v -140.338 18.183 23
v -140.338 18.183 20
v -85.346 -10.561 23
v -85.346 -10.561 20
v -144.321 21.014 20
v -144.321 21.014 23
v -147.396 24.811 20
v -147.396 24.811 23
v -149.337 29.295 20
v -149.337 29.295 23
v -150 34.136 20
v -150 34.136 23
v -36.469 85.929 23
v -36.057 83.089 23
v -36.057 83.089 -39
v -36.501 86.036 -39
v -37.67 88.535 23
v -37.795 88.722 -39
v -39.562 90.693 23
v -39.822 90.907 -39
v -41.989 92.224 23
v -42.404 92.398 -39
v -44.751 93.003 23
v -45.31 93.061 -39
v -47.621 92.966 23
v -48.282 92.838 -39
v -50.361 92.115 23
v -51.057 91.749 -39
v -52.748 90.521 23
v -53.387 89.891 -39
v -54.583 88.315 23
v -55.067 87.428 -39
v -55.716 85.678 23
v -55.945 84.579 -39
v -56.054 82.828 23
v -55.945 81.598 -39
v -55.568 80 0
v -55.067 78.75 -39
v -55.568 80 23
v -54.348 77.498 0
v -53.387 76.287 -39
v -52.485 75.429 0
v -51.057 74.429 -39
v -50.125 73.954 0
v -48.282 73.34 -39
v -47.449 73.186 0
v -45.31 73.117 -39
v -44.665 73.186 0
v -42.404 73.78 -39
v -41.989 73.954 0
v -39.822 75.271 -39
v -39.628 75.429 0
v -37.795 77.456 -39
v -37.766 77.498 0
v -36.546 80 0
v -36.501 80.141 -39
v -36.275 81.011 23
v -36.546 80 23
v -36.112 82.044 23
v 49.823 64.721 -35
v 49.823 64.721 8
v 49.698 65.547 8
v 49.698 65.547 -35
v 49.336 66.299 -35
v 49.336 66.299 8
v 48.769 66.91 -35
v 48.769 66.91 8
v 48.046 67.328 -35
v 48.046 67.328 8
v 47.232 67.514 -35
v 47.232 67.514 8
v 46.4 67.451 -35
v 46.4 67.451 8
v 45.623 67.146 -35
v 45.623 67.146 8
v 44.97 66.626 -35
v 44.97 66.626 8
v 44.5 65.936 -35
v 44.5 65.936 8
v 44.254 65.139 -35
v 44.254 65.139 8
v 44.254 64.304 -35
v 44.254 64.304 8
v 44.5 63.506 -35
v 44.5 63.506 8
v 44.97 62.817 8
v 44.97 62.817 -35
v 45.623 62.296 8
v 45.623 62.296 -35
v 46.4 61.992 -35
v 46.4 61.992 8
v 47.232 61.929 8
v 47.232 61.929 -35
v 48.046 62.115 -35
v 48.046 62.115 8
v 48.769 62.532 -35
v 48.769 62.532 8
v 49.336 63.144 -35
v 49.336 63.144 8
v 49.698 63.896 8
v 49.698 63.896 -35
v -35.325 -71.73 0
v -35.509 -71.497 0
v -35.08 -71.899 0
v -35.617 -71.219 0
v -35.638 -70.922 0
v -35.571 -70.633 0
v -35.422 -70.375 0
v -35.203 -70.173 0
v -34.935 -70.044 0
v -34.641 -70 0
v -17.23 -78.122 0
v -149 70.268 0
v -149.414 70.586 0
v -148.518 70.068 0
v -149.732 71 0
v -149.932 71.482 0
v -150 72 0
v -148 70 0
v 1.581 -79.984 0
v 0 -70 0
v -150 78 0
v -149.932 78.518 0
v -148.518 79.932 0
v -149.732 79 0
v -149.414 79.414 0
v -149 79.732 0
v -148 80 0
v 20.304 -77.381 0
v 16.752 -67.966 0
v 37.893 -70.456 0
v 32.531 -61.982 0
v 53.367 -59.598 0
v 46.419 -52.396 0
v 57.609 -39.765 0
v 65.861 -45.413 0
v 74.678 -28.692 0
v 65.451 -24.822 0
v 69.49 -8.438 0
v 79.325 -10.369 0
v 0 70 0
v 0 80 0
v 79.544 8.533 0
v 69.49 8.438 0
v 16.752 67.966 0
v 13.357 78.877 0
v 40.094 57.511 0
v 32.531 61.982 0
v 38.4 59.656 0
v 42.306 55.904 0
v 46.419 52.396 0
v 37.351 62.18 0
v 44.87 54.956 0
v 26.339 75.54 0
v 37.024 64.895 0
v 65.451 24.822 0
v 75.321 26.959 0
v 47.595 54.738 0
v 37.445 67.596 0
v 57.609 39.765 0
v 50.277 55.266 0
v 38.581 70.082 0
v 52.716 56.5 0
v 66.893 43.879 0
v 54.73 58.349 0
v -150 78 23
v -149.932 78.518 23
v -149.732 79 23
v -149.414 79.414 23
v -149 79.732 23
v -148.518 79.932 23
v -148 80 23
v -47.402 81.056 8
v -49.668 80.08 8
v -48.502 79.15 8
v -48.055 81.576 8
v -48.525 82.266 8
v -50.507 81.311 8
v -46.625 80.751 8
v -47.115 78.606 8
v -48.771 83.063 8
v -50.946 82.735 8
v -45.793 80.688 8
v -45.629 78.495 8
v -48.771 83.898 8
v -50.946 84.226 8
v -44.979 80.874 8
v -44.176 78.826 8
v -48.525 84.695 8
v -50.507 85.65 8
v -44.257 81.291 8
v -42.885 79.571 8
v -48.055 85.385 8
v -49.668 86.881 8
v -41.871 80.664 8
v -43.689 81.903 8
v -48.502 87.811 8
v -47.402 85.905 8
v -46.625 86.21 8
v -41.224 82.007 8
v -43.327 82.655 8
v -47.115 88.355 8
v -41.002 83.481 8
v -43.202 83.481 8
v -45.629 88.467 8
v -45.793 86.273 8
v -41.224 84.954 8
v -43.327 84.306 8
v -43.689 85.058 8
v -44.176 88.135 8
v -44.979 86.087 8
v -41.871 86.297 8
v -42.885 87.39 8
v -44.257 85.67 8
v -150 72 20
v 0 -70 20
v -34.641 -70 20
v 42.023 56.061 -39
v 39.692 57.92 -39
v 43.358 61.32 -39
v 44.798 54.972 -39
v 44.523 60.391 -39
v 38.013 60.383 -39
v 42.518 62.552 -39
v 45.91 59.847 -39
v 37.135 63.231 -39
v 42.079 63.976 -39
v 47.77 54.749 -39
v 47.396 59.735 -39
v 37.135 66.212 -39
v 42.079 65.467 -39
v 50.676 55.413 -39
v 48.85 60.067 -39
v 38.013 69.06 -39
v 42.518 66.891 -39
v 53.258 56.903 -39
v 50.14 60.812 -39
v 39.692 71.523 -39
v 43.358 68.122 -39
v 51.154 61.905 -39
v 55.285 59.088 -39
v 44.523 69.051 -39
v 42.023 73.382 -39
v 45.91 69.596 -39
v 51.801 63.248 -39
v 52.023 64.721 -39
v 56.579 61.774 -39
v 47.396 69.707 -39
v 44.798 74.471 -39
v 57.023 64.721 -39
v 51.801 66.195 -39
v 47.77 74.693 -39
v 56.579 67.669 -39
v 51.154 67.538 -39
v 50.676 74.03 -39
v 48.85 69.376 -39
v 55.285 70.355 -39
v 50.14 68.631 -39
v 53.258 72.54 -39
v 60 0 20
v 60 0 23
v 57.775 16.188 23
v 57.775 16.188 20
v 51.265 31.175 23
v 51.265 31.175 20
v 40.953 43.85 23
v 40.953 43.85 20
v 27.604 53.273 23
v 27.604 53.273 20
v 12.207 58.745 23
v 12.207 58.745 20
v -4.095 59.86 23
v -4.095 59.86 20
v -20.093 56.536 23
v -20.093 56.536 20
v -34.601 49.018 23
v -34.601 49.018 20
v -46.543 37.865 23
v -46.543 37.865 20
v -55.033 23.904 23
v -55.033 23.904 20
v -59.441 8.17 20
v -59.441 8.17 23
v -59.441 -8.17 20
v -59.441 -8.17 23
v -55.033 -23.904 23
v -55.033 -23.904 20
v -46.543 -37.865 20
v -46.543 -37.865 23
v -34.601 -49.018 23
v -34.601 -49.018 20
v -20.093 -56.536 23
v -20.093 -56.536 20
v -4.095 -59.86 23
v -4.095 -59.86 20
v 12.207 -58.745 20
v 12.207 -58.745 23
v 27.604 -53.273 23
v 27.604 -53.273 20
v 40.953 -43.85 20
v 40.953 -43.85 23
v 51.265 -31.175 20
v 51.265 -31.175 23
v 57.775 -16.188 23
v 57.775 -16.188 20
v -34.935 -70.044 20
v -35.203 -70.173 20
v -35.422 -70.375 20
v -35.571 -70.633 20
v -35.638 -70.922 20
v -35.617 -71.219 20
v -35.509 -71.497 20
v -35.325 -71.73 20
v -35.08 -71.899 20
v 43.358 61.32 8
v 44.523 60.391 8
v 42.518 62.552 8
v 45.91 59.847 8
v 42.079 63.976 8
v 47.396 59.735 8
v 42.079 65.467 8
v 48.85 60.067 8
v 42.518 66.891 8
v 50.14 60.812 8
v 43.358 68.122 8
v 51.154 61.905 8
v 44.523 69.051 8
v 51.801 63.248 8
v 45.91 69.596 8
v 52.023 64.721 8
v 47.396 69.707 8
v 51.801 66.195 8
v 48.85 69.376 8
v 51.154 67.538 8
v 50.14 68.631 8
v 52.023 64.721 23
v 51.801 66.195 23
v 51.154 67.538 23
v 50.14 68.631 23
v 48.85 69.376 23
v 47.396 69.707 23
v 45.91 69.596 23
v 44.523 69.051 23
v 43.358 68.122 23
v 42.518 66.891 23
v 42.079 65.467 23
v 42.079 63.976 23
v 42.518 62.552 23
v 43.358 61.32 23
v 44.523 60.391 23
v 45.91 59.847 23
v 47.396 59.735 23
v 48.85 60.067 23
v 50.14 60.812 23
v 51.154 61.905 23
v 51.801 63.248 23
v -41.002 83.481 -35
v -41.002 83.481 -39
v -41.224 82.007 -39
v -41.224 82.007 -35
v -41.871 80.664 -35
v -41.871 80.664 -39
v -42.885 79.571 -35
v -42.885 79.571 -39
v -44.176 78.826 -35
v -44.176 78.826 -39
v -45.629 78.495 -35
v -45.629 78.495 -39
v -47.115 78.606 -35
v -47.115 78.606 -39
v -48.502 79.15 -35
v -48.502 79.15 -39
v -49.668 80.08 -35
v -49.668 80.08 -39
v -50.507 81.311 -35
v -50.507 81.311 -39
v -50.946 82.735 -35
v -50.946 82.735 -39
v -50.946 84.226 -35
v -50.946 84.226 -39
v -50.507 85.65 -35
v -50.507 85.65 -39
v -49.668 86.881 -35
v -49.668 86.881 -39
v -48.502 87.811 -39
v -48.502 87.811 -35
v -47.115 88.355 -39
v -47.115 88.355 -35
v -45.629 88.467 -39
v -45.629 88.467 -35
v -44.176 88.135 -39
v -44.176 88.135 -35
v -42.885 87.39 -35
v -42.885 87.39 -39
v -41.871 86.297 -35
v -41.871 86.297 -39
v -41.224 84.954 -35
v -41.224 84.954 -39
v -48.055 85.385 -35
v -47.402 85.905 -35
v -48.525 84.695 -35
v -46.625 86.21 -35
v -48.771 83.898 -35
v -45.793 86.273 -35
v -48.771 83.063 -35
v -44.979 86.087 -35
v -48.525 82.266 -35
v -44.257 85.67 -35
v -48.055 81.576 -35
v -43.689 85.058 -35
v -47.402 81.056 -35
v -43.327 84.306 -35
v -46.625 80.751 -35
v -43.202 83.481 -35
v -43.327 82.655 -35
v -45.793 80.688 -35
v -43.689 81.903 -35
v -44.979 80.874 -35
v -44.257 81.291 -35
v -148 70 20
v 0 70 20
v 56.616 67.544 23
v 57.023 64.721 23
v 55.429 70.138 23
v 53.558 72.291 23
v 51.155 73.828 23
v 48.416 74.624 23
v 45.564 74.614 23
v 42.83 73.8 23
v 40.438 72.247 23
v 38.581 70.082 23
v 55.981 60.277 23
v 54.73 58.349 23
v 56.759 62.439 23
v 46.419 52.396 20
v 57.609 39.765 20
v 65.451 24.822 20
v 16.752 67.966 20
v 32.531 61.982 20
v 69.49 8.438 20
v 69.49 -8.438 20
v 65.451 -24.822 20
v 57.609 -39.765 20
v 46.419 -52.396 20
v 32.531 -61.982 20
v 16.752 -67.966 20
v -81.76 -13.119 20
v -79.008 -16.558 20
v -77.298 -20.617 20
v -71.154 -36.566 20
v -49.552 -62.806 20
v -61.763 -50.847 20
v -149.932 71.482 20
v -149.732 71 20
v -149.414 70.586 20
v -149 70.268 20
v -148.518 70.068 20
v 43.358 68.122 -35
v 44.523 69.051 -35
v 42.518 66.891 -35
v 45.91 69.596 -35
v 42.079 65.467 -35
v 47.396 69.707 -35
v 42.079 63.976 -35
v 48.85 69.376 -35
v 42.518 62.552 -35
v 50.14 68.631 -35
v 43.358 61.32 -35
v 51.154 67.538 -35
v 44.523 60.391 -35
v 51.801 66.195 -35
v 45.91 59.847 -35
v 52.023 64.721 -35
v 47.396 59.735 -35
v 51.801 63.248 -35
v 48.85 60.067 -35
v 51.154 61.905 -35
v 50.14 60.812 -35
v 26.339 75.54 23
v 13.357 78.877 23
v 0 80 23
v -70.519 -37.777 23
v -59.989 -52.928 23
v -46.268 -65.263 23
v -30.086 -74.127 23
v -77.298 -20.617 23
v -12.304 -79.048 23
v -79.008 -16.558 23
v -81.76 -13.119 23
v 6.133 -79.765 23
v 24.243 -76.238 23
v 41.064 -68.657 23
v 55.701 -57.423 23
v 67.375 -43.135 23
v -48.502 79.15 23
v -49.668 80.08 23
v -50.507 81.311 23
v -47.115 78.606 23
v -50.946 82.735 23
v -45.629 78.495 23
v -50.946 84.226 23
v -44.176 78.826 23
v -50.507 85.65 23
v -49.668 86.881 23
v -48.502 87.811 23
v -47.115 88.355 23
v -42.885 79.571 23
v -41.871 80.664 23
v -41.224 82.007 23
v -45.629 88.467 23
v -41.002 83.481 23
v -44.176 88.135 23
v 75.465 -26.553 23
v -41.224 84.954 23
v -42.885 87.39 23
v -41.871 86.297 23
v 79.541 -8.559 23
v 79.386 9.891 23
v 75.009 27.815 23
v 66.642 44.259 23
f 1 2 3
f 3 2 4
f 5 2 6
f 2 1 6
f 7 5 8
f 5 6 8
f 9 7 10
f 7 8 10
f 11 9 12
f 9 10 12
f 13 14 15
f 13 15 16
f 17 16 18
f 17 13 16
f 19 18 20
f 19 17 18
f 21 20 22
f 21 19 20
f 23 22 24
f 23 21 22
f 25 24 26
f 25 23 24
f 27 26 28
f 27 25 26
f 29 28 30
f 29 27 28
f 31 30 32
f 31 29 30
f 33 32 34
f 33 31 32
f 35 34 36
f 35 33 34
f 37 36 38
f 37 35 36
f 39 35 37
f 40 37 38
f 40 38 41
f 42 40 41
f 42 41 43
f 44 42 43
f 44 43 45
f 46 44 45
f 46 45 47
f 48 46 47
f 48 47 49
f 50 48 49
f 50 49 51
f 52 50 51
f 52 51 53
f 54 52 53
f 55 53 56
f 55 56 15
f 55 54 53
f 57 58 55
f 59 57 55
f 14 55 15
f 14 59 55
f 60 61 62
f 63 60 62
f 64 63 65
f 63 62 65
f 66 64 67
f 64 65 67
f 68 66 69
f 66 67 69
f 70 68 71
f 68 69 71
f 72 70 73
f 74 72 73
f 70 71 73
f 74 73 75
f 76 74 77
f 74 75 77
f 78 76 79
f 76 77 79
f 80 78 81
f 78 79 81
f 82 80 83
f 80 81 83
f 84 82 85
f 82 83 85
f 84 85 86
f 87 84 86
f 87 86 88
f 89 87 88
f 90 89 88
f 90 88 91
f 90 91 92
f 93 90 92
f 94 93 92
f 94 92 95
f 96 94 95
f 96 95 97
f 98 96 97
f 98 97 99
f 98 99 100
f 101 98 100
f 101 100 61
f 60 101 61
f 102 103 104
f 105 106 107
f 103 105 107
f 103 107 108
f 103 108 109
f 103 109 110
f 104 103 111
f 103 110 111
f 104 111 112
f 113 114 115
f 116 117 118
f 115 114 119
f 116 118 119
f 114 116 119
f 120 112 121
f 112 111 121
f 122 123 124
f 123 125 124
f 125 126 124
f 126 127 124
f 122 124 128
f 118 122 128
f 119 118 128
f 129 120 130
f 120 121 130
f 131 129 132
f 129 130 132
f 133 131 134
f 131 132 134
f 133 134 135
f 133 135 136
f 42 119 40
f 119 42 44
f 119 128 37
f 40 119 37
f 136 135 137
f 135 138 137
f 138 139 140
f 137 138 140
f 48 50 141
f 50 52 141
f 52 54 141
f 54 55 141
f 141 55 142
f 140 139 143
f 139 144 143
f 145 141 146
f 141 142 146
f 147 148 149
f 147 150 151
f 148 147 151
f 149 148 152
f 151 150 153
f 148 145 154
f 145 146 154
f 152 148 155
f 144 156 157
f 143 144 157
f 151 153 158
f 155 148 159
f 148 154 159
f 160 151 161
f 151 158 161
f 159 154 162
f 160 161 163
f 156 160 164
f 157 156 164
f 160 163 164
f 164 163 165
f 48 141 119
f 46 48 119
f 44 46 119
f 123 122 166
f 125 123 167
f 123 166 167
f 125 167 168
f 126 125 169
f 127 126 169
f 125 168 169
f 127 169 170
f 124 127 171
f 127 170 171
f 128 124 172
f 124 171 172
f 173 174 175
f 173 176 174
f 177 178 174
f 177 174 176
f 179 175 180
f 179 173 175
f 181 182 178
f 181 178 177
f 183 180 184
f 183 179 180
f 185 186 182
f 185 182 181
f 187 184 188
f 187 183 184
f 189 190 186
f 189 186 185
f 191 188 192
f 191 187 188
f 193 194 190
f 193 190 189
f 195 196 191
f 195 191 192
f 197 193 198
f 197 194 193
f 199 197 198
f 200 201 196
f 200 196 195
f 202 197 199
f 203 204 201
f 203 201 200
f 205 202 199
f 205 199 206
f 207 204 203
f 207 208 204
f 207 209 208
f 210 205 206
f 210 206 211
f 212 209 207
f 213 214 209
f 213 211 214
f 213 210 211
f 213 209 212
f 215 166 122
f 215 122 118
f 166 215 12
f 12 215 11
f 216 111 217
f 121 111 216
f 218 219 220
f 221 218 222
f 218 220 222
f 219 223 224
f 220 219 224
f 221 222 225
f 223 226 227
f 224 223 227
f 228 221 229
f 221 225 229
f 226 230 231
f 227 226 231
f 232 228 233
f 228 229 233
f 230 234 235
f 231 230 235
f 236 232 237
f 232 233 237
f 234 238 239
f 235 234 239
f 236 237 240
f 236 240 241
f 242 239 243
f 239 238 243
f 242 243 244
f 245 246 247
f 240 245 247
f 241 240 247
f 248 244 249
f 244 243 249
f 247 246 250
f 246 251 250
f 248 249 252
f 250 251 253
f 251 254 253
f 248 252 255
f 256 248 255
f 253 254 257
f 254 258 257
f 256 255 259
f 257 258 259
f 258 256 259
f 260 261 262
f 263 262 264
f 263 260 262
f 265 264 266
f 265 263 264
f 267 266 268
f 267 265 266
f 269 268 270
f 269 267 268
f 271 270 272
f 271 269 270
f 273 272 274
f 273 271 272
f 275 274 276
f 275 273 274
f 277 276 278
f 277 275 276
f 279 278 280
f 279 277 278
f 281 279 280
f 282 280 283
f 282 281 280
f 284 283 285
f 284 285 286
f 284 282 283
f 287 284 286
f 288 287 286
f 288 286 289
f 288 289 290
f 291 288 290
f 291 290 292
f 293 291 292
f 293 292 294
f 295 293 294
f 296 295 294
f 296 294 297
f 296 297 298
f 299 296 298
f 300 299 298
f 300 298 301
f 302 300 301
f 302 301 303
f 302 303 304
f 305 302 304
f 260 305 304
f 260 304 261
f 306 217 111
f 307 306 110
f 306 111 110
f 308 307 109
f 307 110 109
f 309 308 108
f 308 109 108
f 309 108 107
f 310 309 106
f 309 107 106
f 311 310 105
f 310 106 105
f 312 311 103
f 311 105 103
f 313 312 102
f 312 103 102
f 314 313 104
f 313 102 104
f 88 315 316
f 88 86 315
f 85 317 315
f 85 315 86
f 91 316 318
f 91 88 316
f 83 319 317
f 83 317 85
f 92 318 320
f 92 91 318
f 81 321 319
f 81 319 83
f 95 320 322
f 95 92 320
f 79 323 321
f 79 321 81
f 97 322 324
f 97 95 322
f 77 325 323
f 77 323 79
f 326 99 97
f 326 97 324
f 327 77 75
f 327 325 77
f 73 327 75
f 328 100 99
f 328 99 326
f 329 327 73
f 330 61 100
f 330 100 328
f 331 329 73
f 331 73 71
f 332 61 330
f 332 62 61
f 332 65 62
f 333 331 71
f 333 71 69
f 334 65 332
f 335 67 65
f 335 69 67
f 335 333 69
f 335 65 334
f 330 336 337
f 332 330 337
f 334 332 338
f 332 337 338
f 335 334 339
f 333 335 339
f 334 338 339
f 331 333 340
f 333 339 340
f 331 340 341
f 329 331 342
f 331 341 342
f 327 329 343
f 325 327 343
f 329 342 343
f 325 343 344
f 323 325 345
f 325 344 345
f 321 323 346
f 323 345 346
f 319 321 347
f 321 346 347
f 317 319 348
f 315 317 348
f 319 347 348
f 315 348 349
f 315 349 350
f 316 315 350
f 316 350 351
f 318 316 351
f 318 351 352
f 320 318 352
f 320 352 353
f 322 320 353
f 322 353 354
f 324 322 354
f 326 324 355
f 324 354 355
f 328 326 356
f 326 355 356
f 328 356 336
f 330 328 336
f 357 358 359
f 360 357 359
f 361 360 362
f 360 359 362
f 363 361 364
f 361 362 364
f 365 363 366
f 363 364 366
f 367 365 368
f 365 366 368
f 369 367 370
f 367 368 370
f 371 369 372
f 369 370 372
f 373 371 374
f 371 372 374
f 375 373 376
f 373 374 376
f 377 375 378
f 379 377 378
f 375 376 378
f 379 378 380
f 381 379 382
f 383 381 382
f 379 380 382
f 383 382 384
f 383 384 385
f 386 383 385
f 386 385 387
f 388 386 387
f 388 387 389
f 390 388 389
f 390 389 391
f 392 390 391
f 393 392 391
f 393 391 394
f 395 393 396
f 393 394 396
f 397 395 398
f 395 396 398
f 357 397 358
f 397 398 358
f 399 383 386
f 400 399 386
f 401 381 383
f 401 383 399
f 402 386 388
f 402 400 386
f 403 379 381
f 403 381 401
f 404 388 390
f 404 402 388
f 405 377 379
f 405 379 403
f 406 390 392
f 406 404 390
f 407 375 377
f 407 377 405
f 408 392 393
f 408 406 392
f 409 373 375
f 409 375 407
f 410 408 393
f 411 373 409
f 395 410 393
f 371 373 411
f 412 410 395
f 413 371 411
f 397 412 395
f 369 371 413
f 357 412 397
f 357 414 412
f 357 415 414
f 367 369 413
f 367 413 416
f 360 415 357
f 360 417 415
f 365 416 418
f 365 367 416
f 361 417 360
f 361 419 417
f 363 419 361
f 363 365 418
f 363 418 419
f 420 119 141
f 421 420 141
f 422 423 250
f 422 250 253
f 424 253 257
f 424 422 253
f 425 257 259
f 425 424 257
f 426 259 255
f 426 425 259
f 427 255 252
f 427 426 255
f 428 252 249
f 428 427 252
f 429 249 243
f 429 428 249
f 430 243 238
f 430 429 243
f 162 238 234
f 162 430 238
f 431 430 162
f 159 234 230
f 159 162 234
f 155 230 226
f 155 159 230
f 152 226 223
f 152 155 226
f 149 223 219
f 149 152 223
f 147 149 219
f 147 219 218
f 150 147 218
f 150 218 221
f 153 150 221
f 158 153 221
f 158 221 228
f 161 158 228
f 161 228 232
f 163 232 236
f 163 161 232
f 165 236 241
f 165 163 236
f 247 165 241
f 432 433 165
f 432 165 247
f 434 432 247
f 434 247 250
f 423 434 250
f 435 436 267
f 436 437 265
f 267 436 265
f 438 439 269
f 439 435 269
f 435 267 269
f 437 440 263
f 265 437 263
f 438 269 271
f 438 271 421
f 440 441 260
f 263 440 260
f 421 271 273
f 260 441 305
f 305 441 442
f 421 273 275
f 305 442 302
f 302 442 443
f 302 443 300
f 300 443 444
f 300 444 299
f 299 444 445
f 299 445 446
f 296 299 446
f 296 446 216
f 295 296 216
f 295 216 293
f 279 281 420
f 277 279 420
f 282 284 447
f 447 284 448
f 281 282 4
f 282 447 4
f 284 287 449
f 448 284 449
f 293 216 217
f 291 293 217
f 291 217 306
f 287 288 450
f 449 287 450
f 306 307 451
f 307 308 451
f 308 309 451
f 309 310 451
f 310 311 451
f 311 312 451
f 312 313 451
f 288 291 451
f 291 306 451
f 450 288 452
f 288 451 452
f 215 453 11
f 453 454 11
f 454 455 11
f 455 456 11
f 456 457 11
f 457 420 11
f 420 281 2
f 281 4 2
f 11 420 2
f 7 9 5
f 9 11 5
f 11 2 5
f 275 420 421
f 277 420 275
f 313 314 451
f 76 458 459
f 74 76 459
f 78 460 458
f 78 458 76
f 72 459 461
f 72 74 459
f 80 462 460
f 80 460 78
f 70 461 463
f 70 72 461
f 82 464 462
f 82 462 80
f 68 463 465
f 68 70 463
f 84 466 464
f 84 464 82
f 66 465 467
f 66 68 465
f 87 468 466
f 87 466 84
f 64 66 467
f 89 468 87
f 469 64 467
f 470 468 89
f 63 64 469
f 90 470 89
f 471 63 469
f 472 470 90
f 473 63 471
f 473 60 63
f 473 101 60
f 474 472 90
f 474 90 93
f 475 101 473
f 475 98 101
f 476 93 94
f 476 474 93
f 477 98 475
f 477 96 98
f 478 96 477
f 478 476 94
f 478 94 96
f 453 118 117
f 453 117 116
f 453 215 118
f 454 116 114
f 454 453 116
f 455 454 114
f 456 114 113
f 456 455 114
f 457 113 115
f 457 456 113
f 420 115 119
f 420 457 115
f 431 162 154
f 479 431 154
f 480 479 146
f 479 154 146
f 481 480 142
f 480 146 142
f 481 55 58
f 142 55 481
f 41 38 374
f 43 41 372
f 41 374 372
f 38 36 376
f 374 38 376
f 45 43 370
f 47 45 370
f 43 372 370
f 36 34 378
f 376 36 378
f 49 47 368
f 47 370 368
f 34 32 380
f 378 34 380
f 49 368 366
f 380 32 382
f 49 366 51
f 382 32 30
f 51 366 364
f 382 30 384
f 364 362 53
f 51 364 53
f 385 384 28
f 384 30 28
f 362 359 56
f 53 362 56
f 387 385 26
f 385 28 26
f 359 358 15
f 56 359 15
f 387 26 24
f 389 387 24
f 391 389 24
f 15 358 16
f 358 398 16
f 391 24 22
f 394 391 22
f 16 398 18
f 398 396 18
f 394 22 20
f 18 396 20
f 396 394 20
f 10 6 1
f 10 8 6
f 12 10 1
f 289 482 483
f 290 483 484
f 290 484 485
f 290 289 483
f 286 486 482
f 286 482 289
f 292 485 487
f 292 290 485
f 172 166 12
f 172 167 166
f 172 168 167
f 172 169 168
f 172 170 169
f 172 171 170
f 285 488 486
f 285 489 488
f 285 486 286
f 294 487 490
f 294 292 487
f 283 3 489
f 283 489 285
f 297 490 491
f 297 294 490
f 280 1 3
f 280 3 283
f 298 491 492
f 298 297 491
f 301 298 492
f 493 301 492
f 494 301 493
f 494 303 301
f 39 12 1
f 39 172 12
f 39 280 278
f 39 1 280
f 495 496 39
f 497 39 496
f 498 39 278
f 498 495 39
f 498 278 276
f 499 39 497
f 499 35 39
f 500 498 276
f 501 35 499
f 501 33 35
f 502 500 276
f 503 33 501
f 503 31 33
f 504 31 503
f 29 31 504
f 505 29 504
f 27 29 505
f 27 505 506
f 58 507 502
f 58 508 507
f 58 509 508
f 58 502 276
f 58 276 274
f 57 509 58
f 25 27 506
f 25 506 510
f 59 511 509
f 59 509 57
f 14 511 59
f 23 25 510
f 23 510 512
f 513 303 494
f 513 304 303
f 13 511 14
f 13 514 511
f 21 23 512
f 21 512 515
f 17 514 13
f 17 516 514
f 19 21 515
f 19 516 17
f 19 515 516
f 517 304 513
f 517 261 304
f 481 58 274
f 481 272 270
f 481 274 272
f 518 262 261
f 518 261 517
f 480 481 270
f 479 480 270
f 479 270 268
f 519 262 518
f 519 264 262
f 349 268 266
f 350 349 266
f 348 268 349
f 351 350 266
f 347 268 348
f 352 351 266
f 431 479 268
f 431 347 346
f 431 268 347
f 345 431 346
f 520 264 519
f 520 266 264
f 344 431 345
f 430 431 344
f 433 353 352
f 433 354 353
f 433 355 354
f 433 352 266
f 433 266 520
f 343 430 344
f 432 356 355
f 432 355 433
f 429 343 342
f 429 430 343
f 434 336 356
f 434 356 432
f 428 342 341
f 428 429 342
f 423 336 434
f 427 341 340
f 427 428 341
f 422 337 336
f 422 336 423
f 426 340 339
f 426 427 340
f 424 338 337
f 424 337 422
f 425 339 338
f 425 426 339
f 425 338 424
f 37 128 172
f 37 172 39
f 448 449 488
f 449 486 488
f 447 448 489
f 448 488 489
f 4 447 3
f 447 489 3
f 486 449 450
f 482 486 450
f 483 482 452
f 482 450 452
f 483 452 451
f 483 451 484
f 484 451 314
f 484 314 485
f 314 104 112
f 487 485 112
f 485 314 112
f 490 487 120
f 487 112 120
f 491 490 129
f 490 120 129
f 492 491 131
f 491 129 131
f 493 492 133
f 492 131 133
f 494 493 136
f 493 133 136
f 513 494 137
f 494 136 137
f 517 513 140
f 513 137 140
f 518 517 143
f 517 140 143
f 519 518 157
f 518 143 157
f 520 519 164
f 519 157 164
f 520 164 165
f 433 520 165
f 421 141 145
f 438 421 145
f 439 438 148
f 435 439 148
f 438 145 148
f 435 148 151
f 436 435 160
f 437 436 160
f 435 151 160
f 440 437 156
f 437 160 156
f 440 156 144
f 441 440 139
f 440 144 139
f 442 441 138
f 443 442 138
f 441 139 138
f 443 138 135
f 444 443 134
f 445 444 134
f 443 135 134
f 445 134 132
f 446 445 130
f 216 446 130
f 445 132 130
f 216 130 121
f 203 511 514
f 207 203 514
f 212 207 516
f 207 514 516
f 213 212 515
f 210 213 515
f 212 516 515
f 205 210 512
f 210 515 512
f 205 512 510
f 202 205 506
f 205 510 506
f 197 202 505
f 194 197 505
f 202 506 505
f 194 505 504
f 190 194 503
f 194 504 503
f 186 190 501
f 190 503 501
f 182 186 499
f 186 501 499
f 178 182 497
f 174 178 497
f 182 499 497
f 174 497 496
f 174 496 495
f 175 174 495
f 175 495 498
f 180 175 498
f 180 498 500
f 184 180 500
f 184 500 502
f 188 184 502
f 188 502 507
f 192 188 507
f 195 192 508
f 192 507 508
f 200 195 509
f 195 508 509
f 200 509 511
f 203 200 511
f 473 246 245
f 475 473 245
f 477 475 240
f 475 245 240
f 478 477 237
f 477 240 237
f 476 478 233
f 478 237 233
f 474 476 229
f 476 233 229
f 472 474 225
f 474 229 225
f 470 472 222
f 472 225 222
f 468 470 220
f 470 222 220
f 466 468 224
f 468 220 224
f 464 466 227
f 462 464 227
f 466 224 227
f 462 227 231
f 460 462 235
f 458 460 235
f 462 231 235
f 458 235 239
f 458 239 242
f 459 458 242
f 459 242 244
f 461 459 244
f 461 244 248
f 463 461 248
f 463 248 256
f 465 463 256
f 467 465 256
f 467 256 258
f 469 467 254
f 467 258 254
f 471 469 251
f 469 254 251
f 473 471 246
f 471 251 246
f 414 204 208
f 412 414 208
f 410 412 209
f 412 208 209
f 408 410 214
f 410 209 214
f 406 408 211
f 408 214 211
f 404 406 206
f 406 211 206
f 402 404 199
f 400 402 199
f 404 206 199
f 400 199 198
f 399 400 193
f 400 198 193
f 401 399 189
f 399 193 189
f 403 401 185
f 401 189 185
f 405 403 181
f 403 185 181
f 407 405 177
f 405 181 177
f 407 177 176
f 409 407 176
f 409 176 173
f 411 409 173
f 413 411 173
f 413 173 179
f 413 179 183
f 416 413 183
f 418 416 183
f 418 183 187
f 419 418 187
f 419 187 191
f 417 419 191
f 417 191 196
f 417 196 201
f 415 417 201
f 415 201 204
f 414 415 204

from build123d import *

# Parameters (mm, degrees)
SKETCH_R        = 60
PAD_DEPTH       = 23
POCKET_DEPTH    = 20
SKETCH002_R     = 10
PAD001_DEPTH    = 62
SKETCH005_R     = 2.8
POCKET001_DEPTH = 62.001
SKETCH006_R     = 5
POCKET002_DEPTH = 4
FILLET_R        = 16
FILLET001_R     = 18
FILLET002_R     = 2
FILLET003_R     = 1
SKETCH007_R     = 5
POCKET003_DEPTH = 15


with BuildPart() as part:
    # Sketch → Pad (new body)
    with BuildSketch(Plane.XY):
        with BuildLine():
            ThreePointArc((-78.765475, -14), (61.318839, -51.38093), (0, 80))
            Line((-150, 80), (0, 80))
            Line((-150, 80), (-150, 23.233627))
            Line((-150, 23.233627), (-78.765475, -14))
        make_face()
        Circle(SKETCH_R, mode=Mode.SUBTRACT)
    extrude(amount=PAD_DEPTH)

    # Sketch001 (on Face6 of Pad) → Pocket (cut)
    with BuildSketch(Plane(origin=(0, 0, 0), x_dir=(1, 0, 0), z_dir=(0, 0, -1))):
        with BuildLine():
            Line((-178.35, 70), (0, 70))
            ThreePointArc((0, -70), (70, 0), (0, 70))
            Line((-178.35, -70), (0, -70))
            Line((-178.35, 70), (-178.35, -70))
        make_face()
    extrude(amount=-POCKET_DEPTH, mode=Mode.SUBTRACT)

    # Sketch002 (on Face6 of Pocket) → Pad001 (join)
    with BuildSketch(Plane.XY.offset(23)):
        with Locations((47.02282, 64.72136)):
            Circle(SKETCH002_R)
        with Locations((-46.056914, 83.088872)):
            Circle(SKETCH002_R)
    extrude(amount=-PAD001_DEPTH)

    # Sketch005 (on Face5 of Pad001) → Pocket001 (cut, through all)
    with BuildSketch(Plane.XY.offset(23)):
        with Locations((-46.002335, 83.480621)):
            Circle(SKETCH005_R)
        with Locations((47.02282, 64.72136)):
            Circle(SKETCH005_R)
    extrude(amount=-POCKET001_DEPTH, mode=Mode.SUBTRACT)

    # Sketch006 (on Face12 of Pocket001) → Pocket002 (cut)
    with BuildSketch(Plane(origin=(0, 0, -39), x_dir=(1, 0, 0), z_dir=(0, 0, -1))):
        with Locations((-46.002335, -83.480621)):
            Circle(SKETCH006_R)
        with Locations((47.02282, -64.72136)):
            Circle(SKETCH006_R)
    extrude(amount=-POCKET002_DEPTH, mode=Mode.SUBTRACT)

    # Fillet
    fillet_edges = [part.edges().sort_by_distance(p)[0] for p in [
        (-78.765475, -14, 21.5),
    ]]
    fillet(fillet_edges, radius=FILLET_R)

    # Fillet001
    fillet001_edges = [part.edges().sort_by_distance(p)[0] for p in [
        (-150, 23.233627, 21.5),
    ]]
    fillet(fillet001_edges, radius=FILLET001_R)

    # Fillet002
    fillet002_edges = [part.edges().sort_by_distance(p)[0] for p in [
        (-150, 70, 10),
        (-150, 80, 11.5),
    ]]
    fillet(fillet002_edges, radius=FILLET002_R)

    # Fillet003
    fillet003_edges = [part.edges().sort_by_distance(p)[0] for p in [
        (-38.729833, -70, 10),
    ]]
    fillet(fillet003_edges, radius=FILLET003_R)

    # Sketch007 (on Face10 of Fillet003) → Pocket003 (cut)
    with BuildSketch(Plane.XY.offset(23)):
        with Locations((47.02282, 64.72136)):
            Circle(SKETCH007_R)
        with Locations((-46.002335, 83.480621)):
            Circle(SKETCH007_R)
    extrude(amount=-POCKET003_DEPTH, mode=Mode.SUBTRACT)


solid = part.part
